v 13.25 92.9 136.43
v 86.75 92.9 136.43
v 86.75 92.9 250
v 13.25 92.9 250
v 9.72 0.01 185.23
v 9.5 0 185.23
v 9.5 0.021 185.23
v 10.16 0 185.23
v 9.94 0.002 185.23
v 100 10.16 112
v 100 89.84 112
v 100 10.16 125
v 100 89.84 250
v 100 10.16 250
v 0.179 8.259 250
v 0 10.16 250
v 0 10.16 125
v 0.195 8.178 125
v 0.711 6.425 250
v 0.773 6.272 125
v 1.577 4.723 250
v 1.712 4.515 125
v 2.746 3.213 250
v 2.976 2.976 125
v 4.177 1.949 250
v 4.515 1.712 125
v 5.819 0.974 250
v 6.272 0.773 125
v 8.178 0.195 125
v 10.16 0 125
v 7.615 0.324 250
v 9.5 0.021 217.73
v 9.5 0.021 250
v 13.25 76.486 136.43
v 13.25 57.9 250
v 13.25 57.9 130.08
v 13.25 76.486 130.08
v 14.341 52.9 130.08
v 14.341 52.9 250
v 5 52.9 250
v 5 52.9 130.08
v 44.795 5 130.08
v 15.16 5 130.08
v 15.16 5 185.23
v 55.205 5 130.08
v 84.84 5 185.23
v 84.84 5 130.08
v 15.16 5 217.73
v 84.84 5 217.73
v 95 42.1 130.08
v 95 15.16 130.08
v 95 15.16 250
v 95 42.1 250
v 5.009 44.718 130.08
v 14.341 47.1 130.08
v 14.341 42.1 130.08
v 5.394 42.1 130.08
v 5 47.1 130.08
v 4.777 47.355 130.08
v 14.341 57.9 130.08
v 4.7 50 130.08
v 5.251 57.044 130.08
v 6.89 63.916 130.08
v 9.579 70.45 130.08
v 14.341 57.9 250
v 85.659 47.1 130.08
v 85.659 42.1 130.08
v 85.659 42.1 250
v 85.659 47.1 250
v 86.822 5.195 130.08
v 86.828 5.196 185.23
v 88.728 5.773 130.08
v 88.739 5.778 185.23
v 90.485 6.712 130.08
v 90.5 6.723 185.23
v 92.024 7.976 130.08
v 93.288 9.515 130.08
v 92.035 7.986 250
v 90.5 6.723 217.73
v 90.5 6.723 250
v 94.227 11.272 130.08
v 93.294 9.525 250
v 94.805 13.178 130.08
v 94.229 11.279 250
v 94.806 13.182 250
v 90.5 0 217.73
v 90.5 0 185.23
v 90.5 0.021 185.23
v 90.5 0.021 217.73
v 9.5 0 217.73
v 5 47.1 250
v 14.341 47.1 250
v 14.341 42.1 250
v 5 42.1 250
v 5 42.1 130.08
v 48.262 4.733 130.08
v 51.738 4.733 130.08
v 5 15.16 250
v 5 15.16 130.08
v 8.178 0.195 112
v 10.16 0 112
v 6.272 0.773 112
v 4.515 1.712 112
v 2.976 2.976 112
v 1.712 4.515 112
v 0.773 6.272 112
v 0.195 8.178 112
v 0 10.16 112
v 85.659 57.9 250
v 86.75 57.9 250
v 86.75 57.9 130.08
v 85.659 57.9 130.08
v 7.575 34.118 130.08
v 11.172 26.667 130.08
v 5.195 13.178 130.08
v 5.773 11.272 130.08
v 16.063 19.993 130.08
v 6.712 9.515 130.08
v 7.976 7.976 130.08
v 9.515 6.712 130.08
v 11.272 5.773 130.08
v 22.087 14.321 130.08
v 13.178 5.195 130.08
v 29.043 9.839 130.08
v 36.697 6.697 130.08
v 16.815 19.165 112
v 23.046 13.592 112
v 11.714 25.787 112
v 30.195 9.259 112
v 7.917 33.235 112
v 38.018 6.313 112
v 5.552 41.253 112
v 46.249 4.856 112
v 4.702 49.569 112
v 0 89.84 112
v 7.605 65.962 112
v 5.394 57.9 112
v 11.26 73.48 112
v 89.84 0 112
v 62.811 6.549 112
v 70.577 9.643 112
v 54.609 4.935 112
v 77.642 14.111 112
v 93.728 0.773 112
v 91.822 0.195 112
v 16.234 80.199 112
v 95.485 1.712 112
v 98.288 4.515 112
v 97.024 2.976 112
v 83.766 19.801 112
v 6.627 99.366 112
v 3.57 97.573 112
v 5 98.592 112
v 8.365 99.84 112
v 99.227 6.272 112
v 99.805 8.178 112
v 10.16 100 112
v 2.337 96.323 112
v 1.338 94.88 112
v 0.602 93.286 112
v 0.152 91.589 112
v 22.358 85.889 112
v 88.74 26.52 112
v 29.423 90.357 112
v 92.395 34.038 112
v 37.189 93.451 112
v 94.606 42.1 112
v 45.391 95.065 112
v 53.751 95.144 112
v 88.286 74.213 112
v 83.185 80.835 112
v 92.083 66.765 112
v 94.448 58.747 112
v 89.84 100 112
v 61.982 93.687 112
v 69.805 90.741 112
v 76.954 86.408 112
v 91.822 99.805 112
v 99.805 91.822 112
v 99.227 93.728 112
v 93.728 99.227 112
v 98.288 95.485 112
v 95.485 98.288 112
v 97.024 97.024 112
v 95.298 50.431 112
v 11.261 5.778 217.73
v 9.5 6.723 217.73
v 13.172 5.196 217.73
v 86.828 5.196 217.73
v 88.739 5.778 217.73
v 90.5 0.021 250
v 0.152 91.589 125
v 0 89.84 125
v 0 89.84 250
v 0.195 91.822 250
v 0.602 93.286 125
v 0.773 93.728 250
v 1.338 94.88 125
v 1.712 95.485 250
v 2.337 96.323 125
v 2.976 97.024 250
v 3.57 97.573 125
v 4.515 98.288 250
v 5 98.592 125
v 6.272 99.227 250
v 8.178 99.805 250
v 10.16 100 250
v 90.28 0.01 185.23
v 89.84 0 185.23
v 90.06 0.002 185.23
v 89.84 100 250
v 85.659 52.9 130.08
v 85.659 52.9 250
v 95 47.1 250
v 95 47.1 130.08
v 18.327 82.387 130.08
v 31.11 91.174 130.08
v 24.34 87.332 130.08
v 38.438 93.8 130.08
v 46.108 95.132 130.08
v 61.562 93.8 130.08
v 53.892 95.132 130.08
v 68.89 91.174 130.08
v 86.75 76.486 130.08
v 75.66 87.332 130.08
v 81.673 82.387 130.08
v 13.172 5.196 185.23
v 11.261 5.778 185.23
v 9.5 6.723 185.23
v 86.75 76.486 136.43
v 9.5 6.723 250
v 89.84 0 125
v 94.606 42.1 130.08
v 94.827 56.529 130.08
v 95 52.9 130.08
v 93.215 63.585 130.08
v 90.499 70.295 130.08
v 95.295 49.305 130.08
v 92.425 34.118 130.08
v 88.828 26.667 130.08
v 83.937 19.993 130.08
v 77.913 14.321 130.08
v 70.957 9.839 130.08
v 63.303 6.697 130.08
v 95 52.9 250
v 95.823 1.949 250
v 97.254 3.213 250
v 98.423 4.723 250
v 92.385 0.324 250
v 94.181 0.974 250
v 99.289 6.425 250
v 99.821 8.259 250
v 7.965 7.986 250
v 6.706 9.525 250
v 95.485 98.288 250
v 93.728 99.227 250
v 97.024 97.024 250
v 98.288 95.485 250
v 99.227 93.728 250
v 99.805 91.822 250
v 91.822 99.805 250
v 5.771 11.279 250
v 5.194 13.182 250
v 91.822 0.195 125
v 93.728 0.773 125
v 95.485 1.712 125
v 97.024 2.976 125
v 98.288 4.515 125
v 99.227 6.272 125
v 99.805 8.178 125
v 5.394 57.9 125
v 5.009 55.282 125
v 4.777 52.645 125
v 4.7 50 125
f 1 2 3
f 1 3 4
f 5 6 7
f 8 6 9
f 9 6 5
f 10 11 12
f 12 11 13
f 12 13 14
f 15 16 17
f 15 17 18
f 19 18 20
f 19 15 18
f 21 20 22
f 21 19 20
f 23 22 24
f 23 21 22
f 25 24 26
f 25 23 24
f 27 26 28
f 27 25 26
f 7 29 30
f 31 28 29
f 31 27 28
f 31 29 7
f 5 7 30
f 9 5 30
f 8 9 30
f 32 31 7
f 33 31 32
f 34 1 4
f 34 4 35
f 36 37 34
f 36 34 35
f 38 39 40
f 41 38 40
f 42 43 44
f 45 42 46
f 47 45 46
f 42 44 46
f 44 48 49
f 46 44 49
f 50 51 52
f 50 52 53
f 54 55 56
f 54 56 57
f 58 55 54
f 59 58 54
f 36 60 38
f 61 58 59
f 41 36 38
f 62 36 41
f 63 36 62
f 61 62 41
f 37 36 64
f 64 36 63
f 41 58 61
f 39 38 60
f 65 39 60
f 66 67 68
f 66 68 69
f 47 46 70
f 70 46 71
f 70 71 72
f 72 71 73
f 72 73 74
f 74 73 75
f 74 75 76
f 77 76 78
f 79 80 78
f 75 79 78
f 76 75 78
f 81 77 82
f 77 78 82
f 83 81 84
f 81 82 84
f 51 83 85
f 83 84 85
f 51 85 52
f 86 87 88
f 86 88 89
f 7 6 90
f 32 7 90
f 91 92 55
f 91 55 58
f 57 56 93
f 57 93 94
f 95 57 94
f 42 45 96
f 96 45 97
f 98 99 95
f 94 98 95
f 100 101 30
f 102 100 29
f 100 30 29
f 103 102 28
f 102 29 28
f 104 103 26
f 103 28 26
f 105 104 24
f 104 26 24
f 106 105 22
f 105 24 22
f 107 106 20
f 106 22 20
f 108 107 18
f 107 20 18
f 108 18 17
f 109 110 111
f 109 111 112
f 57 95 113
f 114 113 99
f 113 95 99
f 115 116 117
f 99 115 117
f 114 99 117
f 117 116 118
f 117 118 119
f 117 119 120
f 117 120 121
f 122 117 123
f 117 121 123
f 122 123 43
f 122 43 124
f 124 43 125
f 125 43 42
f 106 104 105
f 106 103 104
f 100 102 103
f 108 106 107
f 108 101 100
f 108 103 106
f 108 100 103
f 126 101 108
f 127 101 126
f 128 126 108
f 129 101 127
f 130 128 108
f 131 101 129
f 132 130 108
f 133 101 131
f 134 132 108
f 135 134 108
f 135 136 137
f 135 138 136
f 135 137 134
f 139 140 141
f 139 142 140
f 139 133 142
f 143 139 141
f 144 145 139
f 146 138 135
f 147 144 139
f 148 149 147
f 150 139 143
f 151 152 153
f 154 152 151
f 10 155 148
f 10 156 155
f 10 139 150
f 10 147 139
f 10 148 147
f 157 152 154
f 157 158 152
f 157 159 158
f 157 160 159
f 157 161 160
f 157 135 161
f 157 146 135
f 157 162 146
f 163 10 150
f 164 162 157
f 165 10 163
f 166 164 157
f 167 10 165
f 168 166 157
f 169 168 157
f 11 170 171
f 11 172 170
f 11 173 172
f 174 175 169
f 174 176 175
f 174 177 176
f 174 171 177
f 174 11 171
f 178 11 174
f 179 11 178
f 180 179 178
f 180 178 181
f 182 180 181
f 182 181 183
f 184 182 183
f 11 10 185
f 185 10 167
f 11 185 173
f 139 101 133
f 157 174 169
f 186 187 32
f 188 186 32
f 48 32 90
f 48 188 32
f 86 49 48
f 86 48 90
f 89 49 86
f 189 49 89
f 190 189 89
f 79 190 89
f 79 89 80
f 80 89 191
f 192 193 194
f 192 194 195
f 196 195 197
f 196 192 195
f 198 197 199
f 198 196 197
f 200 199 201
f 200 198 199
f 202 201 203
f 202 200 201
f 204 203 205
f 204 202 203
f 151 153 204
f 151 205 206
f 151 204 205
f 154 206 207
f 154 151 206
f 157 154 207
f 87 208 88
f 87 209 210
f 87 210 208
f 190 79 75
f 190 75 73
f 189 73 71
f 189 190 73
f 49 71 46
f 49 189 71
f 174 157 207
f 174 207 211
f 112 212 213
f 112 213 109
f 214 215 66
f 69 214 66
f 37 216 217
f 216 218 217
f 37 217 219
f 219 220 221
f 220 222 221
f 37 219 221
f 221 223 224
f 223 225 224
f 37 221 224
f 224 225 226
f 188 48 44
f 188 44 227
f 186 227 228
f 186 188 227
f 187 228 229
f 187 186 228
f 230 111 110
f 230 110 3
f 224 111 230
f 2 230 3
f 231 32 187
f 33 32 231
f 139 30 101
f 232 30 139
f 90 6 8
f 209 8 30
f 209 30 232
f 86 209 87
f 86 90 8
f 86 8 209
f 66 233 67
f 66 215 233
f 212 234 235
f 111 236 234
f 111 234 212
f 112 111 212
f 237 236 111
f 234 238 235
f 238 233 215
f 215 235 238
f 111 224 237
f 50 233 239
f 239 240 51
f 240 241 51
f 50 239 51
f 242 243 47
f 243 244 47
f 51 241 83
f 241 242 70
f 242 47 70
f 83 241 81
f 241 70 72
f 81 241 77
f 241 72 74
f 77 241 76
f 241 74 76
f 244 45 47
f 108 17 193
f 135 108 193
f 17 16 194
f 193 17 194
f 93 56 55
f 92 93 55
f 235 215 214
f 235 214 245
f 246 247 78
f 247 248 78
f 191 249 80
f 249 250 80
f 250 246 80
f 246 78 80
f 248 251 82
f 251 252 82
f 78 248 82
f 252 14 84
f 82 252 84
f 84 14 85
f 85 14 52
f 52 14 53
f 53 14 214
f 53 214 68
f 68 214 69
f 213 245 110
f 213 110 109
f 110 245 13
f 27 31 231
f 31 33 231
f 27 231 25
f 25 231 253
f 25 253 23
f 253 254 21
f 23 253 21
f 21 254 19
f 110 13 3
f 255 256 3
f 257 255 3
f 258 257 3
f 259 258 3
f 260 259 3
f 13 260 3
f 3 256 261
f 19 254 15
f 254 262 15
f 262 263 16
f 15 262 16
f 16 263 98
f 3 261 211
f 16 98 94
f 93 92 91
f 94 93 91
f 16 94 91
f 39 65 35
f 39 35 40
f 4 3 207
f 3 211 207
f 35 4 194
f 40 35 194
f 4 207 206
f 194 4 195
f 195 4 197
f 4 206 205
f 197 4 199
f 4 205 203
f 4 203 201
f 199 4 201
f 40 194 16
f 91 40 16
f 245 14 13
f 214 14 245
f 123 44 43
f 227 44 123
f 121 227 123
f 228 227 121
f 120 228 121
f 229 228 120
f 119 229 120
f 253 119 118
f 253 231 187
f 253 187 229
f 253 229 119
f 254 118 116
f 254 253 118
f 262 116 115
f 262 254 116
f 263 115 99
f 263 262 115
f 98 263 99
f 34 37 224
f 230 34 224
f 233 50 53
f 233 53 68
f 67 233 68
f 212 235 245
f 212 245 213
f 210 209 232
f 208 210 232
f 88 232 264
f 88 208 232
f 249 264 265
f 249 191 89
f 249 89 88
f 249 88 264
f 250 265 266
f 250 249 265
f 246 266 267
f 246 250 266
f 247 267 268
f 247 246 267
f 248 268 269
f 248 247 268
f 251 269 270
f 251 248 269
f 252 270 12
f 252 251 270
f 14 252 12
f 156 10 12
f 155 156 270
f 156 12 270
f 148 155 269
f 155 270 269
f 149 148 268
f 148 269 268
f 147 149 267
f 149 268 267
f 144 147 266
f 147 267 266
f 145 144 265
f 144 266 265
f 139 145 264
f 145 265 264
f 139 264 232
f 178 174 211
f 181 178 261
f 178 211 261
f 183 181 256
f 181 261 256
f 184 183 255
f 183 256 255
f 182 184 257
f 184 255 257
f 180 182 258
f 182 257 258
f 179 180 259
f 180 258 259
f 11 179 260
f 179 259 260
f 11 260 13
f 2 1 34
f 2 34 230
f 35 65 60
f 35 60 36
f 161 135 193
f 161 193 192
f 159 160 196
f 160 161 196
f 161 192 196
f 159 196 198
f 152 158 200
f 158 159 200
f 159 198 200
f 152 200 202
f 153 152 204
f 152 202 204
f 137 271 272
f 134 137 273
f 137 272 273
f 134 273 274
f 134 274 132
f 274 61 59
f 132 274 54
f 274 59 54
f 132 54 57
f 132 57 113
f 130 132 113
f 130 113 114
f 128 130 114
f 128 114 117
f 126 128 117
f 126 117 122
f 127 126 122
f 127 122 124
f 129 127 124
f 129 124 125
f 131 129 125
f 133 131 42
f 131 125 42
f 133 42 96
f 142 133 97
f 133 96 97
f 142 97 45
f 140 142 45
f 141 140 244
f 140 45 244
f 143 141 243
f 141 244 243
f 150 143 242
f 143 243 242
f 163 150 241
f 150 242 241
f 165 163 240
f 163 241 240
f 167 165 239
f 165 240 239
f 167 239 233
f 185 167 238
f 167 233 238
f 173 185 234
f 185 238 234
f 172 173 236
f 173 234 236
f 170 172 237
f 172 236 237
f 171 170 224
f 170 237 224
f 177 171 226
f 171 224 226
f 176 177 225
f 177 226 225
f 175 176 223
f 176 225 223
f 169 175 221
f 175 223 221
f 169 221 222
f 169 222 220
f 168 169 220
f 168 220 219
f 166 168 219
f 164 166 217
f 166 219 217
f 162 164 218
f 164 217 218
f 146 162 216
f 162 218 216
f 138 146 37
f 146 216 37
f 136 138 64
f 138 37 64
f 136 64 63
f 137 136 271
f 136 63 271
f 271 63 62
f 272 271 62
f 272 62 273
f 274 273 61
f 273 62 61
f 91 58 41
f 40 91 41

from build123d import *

# Parameters (mm, degrees)
SKETCH1_W            = 100
SKETCH1_H            = 100
BOSS_EXTRUDE1_DEPTH  = 250
SKETCH2_W            = 90
SKETCH2_H            = 90
CUT_EXTRUDE1_DEPTH   = 288.228132327
FILLET1_R            = 10.16
SKETCH3_W            = 9.3412
SKETCH3_H            = 5
BOSS_EXTRUDE2_DEPTH  = 250
SKETCH4_W            = 100
SKETCH4_H            = 125
CUT_EXTRUDE2_DEPTH   = 288.228132327
SKETCH6_W            = 90
SKETCH6_H            = 5.08
BOSS_EXTRUDE3_DEPTH  = 95
SKETCH7_R            = 45.3
CUT_EXTRUDE4_DEPTH   = 5.08
SKETCH10_R           = 48.300000047
BOSS_EXTRUDE4_DEPTH  = 30
SKETCH11_R           = 45.3
CUT_EXTRUDE5_DEPTH   = 30
SKETCH13_W           = 63.5
SKETCH13_H           = 63.5
CUT_EXTRUDE7_DEPTH   = 5
FILLET4_R            = 1.27
FILLET5_R            = 10.16
BOSS_EXTRUDE6_DEPTH  = 30
SKETCH16_R           = 45.3
CUT_EXTRUDE8_DEPTH   = 189.745860882
CUT_EXTRUDE10_DEPTH  = 210.821352584
SKETCH19_W           = 81
SKETCH19_H           = 64.77
CUT_EXTRUDE11_DEPTH  = 25.4
SKETCH20_W           = 81
SKETCH20_H           = 32.5
BOSS_EXTRUDE7_DEPTH  = 5
BOSS_EXTRUDE8_START  = 32.5
BOSS_EXTRUDE8_DEPTH  = 32.5
BOSS_EXTRUDE10_DEPTH = 119.92
SKETCH25_W           = 73.5
SKETCH25_H           = 16.413635584
BOSS_EXTRUDE11_DEPTH = 6.35
SKETCH26_W           = 17
SKETCH26_H           = 125.184112418
CUT_EXTRUDE12_DEPTH  = 288.228132327


with BuildPart() as part:
    # Sketch1 → Boss-Extrude1 (new body)
    with BuildSketch(Plane.XY):
        with Locations((50, 50)):
            Rectangle(SKETCH1_W, SKETCH1_H)
    extrude(amount=BOSS_EXTRUDE1_DEPTH)

    # Sketch2 → Cut-Extrude1 (cut, through all)
    with BuildSketch(Plane(origin=(0, 0, 0), x_dir=(-1, 0, 0), z_dir=(0, 0, -1))):
        with Locations((-50, 50)):
            Rectangle(SKETCH2_W, SKETCH2_H)
    extrude(amount=-CUT_EXTRUDE1_DEPTH, mode=Mode.SUBTRACT)

    # Fillet1
    fillet1_edges = [part.edges().sort_by_distance(p)[0] for p in [
        (0, 100, 125),
        (0, 0, 125),
        (100, 0, 125),
        (100, 100, 125),
    ]]
    fillet(fillet1_edges, radius=FILLET1_R)

    # Sketch3 → Boss-Extrude2 (add, through all)
    with BuildSketch(Plane(origin=(0, 0, 0), x_dir=(-1, 0, 0), z_dir=(0, 0, -1))):
        with Locations((-90.3294, 55.4)):
            Rectangle(SKETCH3_W, SKETCH3_H)
        with Locations((-90.3294, 44.6)):
            Rectangle(SKETCH3_W, SKETCH3_H)
        with Locations((-9.6706, 44.6)):
            Rectangle(SKETCH3_W, SKETCH3_H)
        with Locations((-9.6706, 55.4)):
            Rectangle(SKETCH3_W, SKETCH3_H)
    extrude(amount=-BOSS_EXTRUDE2_DEPTH)

    # Sketch4 → Cut-Extrude2 (cut, through all)
    with BuildSketch(Plane(origin=(0, 100, 0), x_dir=(1, 0, 0), z_dir=(0, 1, 0))):
        with Locations((50, -62.5)):
            Rectangle(SKETCH4_W, SKETCH4_H)
    extrude(amount=-CUT_EXTRUDE2_DEPTH, mode=Mode.SUBTRACT)

    # Sketch6 → Boss-Extrude3 (add)
    with BuildSketch(Plane(origin=(0, 5, 0), x_dir=(1, 0, 0), z_dir=(0, 1, 0))):
        with Locations((50, -127.54)):
            Rectangle(SKETCH6_W, SKETCH6_H)
    extrude(amount=BOSS_EXTRUDE3_DEPTH)

    # Sketch7 → Cut-Extrude4 (cut)
    with BuildSketch(Plane(origin=(0, 0, 125), x_dir=(-1, 0, 0), z_dir=(0, 0, -1))):
        with Locations((-50, 50)):
            Circle(SKETCH7_R)
    extrude(amount=-CUT_EXTRUDE4_DEPTH, mode=Mode.SUBTRACT)

    # Sketch10 → Boss-Extrude4 (add)
    with BuildSketch(Plane(origin=(0, 0, 125), x_dir=(-1, 0, 0), z_dir=(0, 0, -1))):
        with Locations(Location((-50, 50, 0), (0, 0, 180))):
            Circle(SKETCH10_R)
    extrude(amount=BOSS_EXTRUDE4_DEPTH)

    # Sketch11 → Cut-Extrude5 (cut)
    with BuildSketch(Plane(origin=(0, 0, 95), x_dir=(-1, 0, 0), z_dir=(0, 0, -1))):
        with Locations((-50, 50)):
            Circle(SKETCH11_R)
    extrude(amount=-CUT_EXTRUDE5_DEPTH, mode=Mode.SUBTRACT)

    # Sketch13 → Cut-Extrude7 (cut)
    with BuildSketch(Plane.XZ):
        with Locations((50, 218.25)):
            Rectangle(SKETCH13_W, SKETCH13_H)
    extrude(amount=-CUT_EXTRUDE7_DEPTH, mode=Mode.SUBTRACT)

    # Fillet4
    fillet4_edges = [part.edges().sort_by_distance(p)[0] for p in [
        (81.75, 0, 218.25),
        (18.25, 0, 218.25),
        (50, 0, 186.5),
    ]]
    fillet(fillet4_edges, radius=FILLET4_R)

    # Fillet5
    fillet5_edges = [part.edges().sort_by_distance(p)[0] for p in [
        (95, 95, 190.04),
        (5, 95, 190.04),
        (5, 5, 190.04),
        (95, 5, 190.04),
    ]]
    fillet(fillet5_edges, radius=FILLET5_R)

    # Sketch14 → Boss-Extrude6 (add)
    with BuildSketch(Plane(origin=(0, 0, 125), x_dir=(-1, 0, 0), z_dir=(0, 0, -1))):
        with BuildLine():
            Line((-5, 100), (-95, 100))
            Line((-95, 100), (-95, 98.592142595))
            ThreePointArc((-95, 98.592142595), (-98.661881885, 94.879841267), (-100, 89.84))
            Line((-100, 89.84), (-100, 10.16))
            ThreePointArc((-100, 10.16), (-97.024204897, 2.975795103), (-89.84, 0))
            Line((-89.84, 0), (-10.16, 0))
            ThreePointArc((-10.16, 0), (-2.975795103, 2.975795103), (0, 10.16))
            Line((0, 10.16), (0, 89.84))
            ThreePointArc((0, 89.84), (-1.338118115, 94.879841267), (-5, 98.592142595))
            Line((-5, 98.592142595), (-5, 100))
        make_face()
    extrude(amount=BOSS_EXTRUDE6_DEPTH)

    # Sketch16 → Cut-Extrude8 (cut, through all)
    with BuildSketch(Plane.XY.offset(125)):
        with Locations(Location((50, 50, 0), (0, 0, 169.956667322))):
            Circle(SKETCH16_R)
    extrude(amount=-CUT_EXTRUDE8_DEPTH, mode=Mode.SUBTRACT)

    # Sketch18 → Cut-Extrude10 (cut, through all)
    with BuildSketch(Plane(origin=(0, 0, 95), x_dir=(-1, 0, 0), z_dir=(0, 0, -1))):
        with BuildLine():
            Line((-100, 89.84), (-100, 107.62))
            Line((-100, 107.62), (0, 107.62))
            Line((0, 107.62), (0, 89.84))
            ThreePointArc((0, 89.84), (-2.975795103, 97.024204897), (-10.16, 100))
            Line((-10.16, 100), (-89.84, 100))
            ThreePointArc((-89.84, 100), (-97.024204897, 97.024204897), (-100, 89.84))
        make_face()
    extrude(amount=-CUT_EXTRUDE10_DEPTH, mode=Mode.SUBTRACT)

    # Sketch19 → Cut-Extrude11 (cut)
    with BuildSketch(Plane.XZ):
        with Locations((50, 217.615)):
            Rectangle(SKETCH19_W, SKETCH19_H)
    extrude(amount=-CUT_EXTRUDE11_DEPTH, mode=Mode.SUBTRACT)

    # Sketch20 → Boss-Extrude7 (add)
    with BuildSketch(Plane.XZ):
        with Locations((50, 201.48)):
            Rectangle(SKETCH20_W, SKETCH20_H)
    extrude(amount=-BOSS_EXTRUDE7_DEPTH)

    # Sketch21 → Boss-Extrude8 (add)
    with BuildSketch(Plane.XY.offset(185.23).offset(BOSS_EXTRUDE8_START)):
        with BuildLine():
            Line((9.5, 5), (15.16, 5))
            ThreePointArc((15.16, 5), (12.201837845, 5.440181243), (9.5, 6.722583334))
            Line((9.5, 6.722583334), (9.5, 5))
        make_face()
        with BuildLine():
            ThreePointArc((90.5, 6.722583334), (87.798162155, 5.440181243), (84.84, 5))
            Line((84.84, 5), (90.5, 5))
            Line((90.5, 5), (90.5, 6.722583334))
        make_face()
    extrude(amount=-BOSS_EXTRUDE8_DEPTH)

    # Sketch24 → Boss-Extrude10 (add)
    with BuildSketch(Plane.XY.offset(130.08)):
        Polygon((95, 57.9), (86.75, 57.9), (86.75, 92.9), (13.25, 92.9), (13.25, 57.9), (5, 57.9), (5, 95), (95, 95), align=None)
    extrude(amount=BOSS_EXTRUDE10_DEPTH)

    # Sketch25 → Boss-Extrude11 (add)
    with BuildSketch(Plane.XY.offset(130.08)):
        with Locations((50, 84.693182208)):
            Rectangle(SKETCH25_W, SKETCH25_H)
    extrude(amount=BOSS_EXTRUDE11_DEPTH)

    # Sketch26 → Cut-Extrude12 (cut, through all)
    with BuildSketch(Plane(origin=(100, 0, 0), x_dir=(0, 0, -1), z_dir=(1, 0, 0))):
        with Locations((-103.5, 50.164427468)):
            Rectangle(SKETCH26_W, SKETCH26_H)
    extrude(amount=-CUT_EXTRUDE12_DEPTH, mode=Mode.SUBTRACT)


solid = part.part
